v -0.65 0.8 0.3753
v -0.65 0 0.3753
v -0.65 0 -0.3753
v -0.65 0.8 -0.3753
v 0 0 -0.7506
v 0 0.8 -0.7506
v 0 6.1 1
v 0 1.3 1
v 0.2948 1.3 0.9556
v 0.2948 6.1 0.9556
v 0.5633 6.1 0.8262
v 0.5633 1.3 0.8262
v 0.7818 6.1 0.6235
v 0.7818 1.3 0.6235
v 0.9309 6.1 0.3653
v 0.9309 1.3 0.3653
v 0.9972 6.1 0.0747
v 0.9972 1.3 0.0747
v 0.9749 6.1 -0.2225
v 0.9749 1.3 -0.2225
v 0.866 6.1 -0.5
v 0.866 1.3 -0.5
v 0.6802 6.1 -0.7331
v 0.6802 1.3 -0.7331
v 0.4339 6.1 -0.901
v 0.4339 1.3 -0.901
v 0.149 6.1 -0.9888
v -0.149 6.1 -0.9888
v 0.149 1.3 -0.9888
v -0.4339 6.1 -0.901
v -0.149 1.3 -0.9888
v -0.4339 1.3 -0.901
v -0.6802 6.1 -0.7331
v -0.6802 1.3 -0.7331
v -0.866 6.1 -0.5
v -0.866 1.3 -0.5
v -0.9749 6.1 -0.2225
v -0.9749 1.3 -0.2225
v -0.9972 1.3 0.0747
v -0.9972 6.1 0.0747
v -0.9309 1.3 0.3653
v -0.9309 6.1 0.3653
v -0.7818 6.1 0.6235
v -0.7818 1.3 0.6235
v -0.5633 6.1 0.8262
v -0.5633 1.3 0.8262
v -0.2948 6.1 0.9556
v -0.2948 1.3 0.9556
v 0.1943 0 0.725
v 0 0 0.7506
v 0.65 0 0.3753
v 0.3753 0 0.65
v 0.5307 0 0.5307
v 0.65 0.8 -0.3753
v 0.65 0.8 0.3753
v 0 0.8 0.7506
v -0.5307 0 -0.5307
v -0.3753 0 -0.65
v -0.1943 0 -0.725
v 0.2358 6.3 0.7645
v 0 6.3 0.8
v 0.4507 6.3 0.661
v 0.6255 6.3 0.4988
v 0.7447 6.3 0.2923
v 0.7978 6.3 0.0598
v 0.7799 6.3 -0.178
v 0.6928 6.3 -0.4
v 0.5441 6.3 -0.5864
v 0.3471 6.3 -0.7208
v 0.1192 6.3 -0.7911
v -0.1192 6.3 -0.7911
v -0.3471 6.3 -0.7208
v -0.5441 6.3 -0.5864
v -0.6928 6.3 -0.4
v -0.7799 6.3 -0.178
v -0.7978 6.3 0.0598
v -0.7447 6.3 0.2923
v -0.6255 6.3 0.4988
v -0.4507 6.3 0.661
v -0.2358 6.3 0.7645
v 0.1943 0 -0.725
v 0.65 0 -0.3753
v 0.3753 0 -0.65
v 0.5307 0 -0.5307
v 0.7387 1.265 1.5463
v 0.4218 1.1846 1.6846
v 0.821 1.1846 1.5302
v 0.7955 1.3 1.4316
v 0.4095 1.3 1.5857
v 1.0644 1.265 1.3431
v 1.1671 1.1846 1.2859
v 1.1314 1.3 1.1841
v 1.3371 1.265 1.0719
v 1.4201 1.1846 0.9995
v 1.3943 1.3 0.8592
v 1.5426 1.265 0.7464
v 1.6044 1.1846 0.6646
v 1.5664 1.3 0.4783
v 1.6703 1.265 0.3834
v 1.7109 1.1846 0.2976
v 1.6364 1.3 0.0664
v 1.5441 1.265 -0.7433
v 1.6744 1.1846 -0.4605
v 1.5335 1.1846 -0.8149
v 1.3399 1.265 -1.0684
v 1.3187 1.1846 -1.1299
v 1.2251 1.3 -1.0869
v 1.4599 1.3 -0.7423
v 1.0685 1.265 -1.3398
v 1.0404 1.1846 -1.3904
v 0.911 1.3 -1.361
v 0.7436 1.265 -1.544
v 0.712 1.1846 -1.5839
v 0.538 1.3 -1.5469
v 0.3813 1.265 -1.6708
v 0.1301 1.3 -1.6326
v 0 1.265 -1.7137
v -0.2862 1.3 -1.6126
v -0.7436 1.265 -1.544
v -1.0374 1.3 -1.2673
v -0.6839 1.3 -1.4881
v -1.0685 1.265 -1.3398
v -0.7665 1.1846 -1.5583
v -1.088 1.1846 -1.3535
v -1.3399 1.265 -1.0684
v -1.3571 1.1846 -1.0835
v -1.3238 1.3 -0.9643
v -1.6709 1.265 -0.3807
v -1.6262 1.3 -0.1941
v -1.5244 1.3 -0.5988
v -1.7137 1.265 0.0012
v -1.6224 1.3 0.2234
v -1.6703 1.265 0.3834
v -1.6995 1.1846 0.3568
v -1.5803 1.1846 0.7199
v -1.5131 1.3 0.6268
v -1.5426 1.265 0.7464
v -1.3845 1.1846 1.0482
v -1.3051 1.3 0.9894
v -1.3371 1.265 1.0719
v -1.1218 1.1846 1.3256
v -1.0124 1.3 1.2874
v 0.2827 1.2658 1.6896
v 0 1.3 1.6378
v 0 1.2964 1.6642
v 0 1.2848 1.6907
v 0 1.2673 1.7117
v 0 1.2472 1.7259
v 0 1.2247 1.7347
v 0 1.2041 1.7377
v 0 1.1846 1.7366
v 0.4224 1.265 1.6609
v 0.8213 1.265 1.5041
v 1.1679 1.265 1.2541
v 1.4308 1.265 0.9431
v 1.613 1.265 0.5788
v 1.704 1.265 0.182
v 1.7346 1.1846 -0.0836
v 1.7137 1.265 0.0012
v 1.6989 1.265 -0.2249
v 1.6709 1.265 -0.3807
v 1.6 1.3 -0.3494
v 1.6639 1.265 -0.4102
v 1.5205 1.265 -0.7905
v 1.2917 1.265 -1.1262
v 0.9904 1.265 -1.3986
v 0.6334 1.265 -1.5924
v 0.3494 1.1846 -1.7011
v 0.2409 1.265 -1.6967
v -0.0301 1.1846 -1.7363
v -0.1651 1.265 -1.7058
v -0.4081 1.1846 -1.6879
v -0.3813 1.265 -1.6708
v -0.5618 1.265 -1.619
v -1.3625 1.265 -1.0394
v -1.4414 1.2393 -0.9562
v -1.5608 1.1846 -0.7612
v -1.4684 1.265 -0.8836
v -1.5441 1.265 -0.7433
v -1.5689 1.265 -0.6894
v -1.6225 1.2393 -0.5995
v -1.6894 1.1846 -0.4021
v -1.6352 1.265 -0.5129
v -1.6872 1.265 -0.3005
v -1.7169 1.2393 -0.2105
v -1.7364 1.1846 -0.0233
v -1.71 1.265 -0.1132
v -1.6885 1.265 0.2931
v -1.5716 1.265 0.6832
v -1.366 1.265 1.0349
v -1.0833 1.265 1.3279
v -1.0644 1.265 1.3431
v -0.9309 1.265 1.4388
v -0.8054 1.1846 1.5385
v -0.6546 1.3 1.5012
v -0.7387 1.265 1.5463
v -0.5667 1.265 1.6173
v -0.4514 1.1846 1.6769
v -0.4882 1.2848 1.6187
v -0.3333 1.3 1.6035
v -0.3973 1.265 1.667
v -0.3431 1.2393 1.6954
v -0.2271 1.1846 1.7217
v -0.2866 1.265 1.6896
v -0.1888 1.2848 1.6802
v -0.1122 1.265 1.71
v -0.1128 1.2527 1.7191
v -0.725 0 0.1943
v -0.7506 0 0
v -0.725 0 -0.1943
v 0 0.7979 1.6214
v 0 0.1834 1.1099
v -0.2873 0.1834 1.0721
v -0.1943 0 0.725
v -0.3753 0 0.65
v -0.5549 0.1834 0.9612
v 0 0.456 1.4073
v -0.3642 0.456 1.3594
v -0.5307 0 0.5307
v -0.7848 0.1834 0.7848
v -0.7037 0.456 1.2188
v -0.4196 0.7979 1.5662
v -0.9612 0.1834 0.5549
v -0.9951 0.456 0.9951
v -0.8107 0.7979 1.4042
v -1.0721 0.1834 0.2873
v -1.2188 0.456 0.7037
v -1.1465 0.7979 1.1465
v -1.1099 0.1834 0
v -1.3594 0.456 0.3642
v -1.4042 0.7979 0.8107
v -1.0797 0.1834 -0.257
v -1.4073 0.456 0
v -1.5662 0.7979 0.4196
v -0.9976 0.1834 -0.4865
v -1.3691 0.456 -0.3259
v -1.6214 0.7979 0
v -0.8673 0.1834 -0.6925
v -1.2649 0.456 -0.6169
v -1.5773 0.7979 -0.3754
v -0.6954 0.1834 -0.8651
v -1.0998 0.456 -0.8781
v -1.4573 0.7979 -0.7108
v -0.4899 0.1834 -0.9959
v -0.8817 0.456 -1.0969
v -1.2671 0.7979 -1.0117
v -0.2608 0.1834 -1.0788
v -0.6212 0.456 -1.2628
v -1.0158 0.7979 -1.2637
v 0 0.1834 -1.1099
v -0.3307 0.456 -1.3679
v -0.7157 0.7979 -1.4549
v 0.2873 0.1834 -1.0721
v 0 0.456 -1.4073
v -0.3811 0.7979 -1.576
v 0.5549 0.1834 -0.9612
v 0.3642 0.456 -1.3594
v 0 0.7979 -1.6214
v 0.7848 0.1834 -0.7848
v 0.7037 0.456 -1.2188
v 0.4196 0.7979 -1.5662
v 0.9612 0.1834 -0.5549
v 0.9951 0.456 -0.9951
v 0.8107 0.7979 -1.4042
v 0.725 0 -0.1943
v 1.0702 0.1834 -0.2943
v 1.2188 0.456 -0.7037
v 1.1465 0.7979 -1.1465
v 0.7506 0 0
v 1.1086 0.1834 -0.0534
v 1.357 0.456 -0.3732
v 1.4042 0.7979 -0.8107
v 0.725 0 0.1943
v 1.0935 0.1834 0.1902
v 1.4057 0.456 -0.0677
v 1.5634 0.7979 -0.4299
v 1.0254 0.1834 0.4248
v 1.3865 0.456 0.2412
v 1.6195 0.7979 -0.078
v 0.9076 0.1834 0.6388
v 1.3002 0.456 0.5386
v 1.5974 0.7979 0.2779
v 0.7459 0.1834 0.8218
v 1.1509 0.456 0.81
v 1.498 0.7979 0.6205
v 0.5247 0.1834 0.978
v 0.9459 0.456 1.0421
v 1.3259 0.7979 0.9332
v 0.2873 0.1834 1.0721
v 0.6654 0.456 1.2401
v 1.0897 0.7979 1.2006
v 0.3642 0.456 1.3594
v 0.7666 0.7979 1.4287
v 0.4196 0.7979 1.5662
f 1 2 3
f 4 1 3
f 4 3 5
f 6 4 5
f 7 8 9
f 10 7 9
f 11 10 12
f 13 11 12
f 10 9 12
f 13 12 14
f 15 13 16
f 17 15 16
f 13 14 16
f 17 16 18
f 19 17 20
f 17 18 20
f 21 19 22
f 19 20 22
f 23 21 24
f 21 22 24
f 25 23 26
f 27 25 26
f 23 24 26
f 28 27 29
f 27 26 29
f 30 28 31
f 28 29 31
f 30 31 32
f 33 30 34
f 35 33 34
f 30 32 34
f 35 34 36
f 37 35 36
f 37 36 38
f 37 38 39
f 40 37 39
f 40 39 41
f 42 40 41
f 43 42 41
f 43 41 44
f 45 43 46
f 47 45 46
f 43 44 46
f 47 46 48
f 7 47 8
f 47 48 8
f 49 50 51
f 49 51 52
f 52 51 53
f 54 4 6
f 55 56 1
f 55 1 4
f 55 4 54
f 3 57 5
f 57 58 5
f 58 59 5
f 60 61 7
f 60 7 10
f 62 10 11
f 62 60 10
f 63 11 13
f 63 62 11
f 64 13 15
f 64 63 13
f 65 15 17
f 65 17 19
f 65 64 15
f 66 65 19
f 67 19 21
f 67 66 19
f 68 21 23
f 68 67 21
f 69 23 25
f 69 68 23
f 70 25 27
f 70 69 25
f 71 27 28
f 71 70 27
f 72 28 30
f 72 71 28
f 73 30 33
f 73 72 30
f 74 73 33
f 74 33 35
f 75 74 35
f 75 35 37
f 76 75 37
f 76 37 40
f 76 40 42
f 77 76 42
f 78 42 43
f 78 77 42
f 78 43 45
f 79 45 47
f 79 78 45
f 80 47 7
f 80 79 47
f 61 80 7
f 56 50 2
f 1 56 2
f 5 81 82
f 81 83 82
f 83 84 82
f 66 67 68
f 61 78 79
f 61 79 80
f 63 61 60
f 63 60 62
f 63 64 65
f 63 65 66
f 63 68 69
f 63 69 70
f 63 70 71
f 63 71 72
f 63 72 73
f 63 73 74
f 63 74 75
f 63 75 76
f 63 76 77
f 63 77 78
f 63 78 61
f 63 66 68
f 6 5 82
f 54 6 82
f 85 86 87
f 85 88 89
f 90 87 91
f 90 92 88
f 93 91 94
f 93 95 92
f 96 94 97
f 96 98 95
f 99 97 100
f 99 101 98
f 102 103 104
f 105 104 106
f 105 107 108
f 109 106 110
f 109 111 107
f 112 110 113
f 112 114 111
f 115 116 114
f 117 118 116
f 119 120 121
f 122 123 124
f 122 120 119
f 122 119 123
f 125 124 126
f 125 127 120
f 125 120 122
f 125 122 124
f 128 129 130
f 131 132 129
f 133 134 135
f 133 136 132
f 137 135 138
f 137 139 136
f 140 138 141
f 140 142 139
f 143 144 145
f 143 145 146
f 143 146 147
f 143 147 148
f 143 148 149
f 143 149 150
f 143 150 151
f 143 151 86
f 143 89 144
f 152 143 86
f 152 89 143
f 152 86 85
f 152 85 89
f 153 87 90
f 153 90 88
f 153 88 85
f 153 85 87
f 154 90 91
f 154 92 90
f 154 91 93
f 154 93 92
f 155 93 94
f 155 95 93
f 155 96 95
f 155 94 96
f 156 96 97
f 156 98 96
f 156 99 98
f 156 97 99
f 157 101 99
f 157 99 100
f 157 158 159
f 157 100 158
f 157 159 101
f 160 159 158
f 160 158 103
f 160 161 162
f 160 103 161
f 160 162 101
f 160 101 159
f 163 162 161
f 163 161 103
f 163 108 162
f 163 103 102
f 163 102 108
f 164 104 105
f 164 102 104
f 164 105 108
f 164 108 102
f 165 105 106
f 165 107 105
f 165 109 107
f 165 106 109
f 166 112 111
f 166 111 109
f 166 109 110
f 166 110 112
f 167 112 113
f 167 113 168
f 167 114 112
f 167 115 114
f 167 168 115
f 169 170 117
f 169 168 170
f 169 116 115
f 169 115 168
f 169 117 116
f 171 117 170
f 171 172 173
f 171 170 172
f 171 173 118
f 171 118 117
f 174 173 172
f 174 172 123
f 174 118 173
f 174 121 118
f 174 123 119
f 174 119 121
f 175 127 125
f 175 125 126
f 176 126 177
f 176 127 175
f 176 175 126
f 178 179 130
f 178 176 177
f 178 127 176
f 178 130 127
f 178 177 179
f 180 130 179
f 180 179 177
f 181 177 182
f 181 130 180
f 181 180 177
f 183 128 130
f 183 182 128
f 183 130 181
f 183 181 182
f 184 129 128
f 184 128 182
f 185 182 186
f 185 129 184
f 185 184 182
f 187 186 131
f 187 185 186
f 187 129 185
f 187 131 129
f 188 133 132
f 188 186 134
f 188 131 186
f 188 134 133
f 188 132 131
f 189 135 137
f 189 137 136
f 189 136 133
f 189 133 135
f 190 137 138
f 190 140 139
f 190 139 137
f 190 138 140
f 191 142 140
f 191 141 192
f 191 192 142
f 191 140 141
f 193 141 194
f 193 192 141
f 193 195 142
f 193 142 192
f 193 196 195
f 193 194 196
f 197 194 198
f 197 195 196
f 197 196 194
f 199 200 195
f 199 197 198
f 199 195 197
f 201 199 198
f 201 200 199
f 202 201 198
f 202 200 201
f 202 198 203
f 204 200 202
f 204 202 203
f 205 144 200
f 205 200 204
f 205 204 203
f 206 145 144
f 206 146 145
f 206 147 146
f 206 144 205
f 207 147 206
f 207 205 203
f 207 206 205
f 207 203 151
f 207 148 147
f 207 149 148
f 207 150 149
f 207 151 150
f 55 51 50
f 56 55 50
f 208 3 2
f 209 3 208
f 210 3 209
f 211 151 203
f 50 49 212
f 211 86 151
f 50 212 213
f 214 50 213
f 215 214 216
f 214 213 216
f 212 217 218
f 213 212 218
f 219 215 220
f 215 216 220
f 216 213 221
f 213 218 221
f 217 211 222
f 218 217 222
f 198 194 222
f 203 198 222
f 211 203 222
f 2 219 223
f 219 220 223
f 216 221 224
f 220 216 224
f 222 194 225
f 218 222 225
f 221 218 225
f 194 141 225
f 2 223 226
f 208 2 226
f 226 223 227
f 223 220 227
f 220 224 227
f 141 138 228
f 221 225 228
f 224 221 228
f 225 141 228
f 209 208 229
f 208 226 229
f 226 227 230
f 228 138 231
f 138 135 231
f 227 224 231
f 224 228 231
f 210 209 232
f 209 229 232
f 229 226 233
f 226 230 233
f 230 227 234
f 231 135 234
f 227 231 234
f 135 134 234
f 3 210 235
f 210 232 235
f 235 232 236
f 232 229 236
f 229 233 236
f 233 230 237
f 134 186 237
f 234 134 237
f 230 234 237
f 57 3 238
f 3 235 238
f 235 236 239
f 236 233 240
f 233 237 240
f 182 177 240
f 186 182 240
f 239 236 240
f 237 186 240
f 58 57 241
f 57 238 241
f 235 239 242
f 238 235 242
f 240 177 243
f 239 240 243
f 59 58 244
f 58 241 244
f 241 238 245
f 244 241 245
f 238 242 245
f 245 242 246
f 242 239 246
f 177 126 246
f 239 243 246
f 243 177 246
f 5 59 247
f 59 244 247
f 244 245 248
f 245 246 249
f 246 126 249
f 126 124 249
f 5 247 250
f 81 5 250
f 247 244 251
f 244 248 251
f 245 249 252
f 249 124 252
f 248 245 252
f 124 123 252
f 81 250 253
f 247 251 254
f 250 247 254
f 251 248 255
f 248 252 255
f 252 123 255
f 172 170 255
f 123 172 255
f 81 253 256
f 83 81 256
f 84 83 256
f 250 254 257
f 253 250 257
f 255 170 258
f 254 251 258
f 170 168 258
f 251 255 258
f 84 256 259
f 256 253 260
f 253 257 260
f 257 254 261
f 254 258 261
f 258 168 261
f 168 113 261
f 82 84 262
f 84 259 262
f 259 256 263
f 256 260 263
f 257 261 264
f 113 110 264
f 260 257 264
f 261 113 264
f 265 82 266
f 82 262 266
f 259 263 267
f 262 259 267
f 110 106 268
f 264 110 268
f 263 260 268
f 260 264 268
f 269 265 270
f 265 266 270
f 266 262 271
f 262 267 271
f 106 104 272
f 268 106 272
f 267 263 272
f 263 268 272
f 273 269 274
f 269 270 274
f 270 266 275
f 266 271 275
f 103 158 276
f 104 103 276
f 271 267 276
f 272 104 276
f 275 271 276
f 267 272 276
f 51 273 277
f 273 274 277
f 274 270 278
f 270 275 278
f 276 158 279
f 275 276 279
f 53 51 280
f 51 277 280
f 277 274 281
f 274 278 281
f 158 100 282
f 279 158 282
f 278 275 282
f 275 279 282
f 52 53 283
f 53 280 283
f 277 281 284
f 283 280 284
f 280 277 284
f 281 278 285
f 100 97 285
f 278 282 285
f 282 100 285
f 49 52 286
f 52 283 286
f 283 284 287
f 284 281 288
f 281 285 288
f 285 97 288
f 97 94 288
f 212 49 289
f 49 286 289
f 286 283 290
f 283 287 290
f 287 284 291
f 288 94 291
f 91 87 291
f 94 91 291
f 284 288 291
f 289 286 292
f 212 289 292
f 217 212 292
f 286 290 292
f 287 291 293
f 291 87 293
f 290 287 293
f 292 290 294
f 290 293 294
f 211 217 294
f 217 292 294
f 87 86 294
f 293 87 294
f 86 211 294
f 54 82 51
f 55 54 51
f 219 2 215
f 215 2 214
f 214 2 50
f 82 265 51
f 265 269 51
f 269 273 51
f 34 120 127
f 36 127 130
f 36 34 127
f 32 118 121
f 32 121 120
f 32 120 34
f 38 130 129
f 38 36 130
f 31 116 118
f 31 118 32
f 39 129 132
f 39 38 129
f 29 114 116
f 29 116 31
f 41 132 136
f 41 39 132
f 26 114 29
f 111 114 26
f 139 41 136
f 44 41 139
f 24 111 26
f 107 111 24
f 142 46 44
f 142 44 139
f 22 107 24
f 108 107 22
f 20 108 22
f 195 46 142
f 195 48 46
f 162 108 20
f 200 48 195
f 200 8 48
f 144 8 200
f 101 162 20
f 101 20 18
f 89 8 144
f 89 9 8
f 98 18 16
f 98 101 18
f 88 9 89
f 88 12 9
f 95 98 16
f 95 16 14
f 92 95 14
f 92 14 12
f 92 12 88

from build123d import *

# Parameters (mm, degrees)
SKETCH1_R           = 1.75
BOSS_EXTRUDE1_DEPTH = 1.3
SKETCH2_R           = 1
BOSS_EXTRUDE2_DEPTH = 5
CUT_EXTRUDE1_DEPTH  = 0.8
CHAMFER1_SIZE       = 0.2
FILLET1_R           = 0.1


with BuildPart() as part:
    # Sketch1 → Boss-Extrude1 (new body)
    with BuildSketch(Plane(origin=(0, 0, 0), x_dir=(1, 0, 0), z_dir=(0, 1, 0))):
        with Locations(Location((0, 0, 0), (0, 0, 270))):
            Circle(SKETCH1_R)
    extrude(amount=BOSS_EXTRUDE1_DEPTH)

    # Sketch2 → Boss-Extrude2 (add)
    with BuildSketch(Plane(origin=(0, 1.3, 0), x_dir=(1, 0, 0), z_dir=(0, 1, 0))):
        with Locations(Location((0, 0, 0), (0, 0, 270))):
            Circle(SKETCH2_R)
    extrude(amount=BOSS_EXTRUDE2_DEPTH)

    # Sketch3 → Cut-Extrude1 (cut)
    with BuildSketch(Plane.XZ):
        Polygon((0, -0.75055535), (0.65, -0.375277675), (0.65, 0.375277675), (0, 0.75055535), (-0.65, 0.375277675), (-0.65, -0.375277675), align=None)
    extrude(amount=-CUT_EXTRUDE1_DEPTH, mode=Mode.SUBTRACT)

    # Chamfer1
    chamfer1_edges = [part.edges().sort_by_distance(p)[0] for p in [
        (0, 6.3, -1),
    ]]
    chamfer(chamfer1_edges, length=CHAMFER1_SIZE)

    # Sketch4 → Cut-Revolve1 (revolve, cut)
    with BuildSketch(Plane(origin=(0, 0, 0), x_dir=(0, 0, -1), z_dir=(1, 0, 0)), mode=Mode.PRIVATE) as cut_revolve1_sk:
        with BuildLine():
            Line((1.75, 1.3), (1.75, 0))
            Line((1.75, 0), (0.75055535, 0))
            ThreePointArc((0.75055535, 0), (1.443641612, 0.501341114), (1.75, 1.3))
        make_face()
    revolve(cut_revolve1_sk.sketch.rotate(Axis((0, 6.3, 0), (0, -1, 0)), 180), axis=Axis((0, 6.3, 0), (0, -1, 0)), mode=Mode.SUBTRACT)

    # Fillet1
    fillet1_edges = [part.edges().sort_by_distance(p)[0] for p in [
        (0, 1.3, -1.75),
    ]]
    fillet(fillet1_edges, radius=FILLET1_R)


solid = part.part
